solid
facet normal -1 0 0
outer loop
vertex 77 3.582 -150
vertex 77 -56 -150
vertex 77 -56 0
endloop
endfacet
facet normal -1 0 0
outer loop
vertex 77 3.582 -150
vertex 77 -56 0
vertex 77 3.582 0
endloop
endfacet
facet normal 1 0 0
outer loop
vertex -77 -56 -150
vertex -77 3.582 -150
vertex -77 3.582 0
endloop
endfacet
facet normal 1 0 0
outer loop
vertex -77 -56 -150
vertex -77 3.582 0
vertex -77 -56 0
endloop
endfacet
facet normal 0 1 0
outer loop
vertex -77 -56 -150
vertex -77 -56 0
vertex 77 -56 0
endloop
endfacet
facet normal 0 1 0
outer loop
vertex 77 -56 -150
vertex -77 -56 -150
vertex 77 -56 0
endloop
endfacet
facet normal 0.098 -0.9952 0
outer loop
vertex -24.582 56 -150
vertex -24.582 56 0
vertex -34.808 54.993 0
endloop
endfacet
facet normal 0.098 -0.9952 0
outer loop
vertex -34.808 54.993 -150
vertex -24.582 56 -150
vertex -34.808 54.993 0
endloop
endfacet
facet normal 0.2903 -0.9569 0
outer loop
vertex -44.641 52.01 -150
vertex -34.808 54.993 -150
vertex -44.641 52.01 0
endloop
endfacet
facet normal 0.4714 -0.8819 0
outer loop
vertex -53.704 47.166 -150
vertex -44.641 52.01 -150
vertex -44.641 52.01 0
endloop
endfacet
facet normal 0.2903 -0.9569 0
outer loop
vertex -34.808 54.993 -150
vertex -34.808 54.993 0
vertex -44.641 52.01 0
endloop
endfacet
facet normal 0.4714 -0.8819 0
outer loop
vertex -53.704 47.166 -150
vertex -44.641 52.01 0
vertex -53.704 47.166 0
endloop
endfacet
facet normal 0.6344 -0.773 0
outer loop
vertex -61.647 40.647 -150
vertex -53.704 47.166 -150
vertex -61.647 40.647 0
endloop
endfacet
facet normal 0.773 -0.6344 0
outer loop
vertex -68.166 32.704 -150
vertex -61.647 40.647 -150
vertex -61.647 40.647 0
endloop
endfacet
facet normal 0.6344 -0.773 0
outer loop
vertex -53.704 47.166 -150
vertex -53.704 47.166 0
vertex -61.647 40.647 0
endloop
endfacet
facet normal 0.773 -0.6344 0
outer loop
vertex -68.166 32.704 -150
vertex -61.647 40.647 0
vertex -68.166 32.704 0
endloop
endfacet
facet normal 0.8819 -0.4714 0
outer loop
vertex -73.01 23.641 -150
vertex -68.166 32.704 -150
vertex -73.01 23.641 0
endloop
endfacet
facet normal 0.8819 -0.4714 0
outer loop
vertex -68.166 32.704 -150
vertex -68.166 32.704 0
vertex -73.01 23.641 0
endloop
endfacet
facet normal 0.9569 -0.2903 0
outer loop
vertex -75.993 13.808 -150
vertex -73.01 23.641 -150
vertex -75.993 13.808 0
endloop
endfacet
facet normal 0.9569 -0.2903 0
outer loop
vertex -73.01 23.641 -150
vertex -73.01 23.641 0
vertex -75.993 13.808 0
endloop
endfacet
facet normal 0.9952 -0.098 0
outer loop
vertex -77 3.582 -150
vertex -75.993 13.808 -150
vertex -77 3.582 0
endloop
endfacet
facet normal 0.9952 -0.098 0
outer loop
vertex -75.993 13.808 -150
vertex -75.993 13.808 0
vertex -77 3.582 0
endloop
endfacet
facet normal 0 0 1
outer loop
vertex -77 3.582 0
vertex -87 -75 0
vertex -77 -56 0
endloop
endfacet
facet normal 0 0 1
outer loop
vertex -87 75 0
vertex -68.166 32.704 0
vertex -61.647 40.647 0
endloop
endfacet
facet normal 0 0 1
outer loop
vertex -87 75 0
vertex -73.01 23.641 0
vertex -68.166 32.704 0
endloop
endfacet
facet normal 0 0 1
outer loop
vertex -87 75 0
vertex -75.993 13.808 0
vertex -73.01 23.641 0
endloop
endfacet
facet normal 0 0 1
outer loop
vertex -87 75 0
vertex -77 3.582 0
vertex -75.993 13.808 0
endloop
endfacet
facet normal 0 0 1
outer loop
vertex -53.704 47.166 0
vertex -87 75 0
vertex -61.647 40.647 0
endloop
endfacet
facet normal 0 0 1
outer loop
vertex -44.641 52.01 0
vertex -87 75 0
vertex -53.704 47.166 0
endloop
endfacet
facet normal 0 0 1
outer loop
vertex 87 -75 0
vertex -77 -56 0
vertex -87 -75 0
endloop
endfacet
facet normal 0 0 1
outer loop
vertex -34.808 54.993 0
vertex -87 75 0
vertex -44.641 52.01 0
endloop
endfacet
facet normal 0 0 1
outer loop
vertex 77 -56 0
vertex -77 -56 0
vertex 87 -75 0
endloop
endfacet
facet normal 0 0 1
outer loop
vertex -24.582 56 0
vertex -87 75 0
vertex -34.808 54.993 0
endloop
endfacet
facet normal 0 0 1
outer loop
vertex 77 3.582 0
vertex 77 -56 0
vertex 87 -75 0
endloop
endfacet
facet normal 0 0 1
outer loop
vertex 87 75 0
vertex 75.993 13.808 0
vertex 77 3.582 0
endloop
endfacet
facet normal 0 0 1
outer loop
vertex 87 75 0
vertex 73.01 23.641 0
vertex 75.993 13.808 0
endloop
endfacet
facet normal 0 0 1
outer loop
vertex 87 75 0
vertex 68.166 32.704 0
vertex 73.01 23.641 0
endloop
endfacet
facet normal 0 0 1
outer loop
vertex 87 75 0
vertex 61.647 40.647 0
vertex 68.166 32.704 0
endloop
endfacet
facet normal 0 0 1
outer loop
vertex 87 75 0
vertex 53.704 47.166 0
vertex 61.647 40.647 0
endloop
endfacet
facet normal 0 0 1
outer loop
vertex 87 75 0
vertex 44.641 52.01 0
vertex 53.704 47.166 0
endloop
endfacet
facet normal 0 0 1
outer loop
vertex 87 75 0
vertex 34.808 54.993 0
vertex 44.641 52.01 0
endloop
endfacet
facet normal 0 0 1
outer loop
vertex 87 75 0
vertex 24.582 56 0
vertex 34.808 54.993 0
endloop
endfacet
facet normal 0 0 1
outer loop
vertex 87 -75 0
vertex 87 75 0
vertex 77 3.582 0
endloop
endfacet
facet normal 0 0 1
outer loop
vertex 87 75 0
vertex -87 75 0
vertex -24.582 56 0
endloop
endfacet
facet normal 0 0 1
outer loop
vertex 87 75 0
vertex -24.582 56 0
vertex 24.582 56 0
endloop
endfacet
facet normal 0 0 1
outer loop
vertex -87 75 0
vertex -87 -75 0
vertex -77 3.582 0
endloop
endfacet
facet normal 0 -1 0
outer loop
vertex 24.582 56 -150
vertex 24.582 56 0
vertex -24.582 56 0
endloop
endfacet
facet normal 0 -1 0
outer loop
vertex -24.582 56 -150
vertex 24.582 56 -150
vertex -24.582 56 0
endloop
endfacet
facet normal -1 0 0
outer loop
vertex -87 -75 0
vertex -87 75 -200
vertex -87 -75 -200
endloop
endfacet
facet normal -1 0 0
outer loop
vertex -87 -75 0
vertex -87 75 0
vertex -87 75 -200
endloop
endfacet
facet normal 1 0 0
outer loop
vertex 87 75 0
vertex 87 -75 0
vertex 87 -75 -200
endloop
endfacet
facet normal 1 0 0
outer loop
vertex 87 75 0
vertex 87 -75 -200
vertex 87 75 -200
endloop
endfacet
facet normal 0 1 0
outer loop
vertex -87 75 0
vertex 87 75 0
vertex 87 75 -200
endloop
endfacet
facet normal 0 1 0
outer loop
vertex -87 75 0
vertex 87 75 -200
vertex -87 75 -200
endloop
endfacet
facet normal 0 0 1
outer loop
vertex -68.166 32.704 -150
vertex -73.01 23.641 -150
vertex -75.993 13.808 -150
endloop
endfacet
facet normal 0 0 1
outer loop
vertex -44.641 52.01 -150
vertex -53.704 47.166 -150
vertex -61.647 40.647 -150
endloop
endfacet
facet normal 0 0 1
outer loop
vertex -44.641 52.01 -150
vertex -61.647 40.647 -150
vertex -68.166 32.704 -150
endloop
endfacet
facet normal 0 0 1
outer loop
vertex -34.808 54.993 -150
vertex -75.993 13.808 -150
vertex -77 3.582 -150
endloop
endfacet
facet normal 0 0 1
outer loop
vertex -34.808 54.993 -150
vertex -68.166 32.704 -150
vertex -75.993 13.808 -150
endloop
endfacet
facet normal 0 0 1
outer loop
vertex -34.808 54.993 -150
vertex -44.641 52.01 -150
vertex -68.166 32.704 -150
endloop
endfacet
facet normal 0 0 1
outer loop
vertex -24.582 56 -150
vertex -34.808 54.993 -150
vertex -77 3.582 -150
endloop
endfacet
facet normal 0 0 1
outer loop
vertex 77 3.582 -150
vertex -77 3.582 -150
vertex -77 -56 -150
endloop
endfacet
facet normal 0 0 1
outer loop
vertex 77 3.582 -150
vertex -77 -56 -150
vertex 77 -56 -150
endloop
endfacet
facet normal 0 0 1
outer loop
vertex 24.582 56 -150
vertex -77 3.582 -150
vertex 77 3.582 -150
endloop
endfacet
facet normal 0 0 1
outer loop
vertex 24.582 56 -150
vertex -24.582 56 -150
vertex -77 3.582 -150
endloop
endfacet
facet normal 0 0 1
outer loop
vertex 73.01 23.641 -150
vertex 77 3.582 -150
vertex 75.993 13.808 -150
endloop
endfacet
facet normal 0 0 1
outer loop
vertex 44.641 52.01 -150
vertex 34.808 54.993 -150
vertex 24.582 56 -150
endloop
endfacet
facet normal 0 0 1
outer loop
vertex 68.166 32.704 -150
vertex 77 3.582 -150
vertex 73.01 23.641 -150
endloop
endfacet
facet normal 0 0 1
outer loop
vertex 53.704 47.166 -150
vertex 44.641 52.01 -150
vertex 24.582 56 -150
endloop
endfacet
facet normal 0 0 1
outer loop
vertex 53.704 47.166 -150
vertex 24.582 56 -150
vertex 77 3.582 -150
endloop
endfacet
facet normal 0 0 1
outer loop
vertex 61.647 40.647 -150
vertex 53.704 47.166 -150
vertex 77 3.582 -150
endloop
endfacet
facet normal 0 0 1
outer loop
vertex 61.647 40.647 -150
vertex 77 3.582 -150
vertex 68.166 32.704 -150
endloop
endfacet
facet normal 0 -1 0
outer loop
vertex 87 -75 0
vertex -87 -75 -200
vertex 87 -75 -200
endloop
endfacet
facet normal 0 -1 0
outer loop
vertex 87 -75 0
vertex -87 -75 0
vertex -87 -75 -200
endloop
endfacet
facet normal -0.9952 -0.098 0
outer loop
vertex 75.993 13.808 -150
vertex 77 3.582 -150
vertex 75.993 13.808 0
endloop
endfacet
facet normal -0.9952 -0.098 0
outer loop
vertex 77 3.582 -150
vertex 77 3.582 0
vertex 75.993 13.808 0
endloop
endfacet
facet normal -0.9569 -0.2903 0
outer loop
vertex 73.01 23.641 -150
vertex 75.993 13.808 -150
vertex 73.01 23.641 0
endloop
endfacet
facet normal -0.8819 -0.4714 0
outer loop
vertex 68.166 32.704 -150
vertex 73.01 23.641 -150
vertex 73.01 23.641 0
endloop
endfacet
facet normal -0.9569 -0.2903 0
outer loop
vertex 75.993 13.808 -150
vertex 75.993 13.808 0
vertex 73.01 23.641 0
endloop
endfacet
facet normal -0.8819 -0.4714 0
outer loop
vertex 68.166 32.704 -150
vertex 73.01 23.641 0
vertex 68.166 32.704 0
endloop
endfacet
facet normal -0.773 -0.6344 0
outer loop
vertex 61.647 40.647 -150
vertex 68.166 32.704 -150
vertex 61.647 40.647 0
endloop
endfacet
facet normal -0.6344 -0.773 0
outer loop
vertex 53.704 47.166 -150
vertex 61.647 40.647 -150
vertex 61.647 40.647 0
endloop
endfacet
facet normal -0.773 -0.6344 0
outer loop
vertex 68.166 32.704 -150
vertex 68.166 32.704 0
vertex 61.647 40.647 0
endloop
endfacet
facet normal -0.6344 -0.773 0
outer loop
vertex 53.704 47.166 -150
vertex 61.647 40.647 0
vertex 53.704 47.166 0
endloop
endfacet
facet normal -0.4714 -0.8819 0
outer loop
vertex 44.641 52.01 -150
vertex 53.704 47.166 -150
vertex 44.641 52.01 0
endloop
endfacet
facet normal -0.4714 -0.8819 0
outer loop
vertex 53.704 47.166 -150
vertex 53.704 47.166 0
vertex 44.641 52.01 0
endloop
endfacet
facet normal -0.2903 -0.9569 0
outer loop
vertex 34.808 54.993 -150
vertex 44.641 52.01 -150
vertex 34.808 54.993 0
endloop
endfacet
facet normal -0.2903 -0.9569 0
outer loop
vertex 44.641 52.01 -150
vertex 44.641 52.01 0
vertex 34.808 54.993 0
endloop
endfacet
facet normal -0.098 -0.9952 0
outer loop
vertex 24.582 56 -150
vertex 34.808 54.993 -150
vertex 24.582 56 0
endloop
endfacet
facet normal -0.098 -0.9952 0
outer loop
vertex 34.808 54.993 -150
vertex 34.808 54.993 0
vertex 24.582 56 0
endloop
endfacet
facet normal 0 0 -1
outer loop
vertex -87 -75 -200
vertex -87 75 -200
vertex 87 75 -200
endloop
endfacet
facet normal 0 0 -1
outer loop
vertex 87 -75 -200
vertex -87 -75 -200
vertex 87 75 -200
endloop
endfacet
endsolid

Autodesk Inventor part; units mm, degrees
ref_plane "YZ Plane" through (0, 0, 0) normal (1, 0, 0) x (0, 1, 0)
ref_plane "XZ Plane" through (0, 0, 0) normal (0, 1, 0) x (-1, 0, 0)
ref_plane "XY Plane" through (0, 0, 0) normal (0, 0, 1) x (1, 0, 0)
sketch "Sketch2" plane through (0, 0, 0) normal (0, 0, 1) x (1, 0, 0)
  line L0 (87, 75) -> (-87, 75)
  line L1 (-87, 75) -> (-87, -75)
  line L2 (-87, -75) -> (87, -75)
  line L3 (87, -75) -> (87, 75)
  line L4 (87, 75) -> (-87, -75) construction
  line L5 (-87, 75) -> (87, -75) construction
  point P0 (0, 0)
  dimension "d3" = 174
  dimension "d4" = 150
sketch "Sketch1" plane through (0, 0, 0) normal (0, 0, 1) x (1, 0, 0)
  line L0 (77, 56) -> (-77, 56)
  line L1 (-77, 56) -> (-77, -56)
  line L2 (-77, -56) -> (77, -56)
  line L3 (77, -56) -> (77, 56)
  line L4 (77, 56) -> (-77, -56) construction
  line L5 (-77, 56) -> (77, -56) construction
  arc A0 (77, 3.5816) -> (24.5816, 56) centre (24.5816, 3.5816) ccw
  line L6 (-77, -56) -> (59.13, 43.0036) construction
  arc A1 (-24.5816, 56) -> (-77, 3.5816) centre (-24.5816, 3.5816) ccw
  point P0 (0, 0)
  dimension "d0" = 154
  dimension "d1" = 112
  dimension "d2" = 136.13
extrude "Extrusion1" add sketch "Sketch2" against normal blind 200
extrude "Extrusion2" cut sketch "Sketch1" against normal blind 150 contours A0 L3 L2 L1 A1 L0
properties part number "thermostatBath"
